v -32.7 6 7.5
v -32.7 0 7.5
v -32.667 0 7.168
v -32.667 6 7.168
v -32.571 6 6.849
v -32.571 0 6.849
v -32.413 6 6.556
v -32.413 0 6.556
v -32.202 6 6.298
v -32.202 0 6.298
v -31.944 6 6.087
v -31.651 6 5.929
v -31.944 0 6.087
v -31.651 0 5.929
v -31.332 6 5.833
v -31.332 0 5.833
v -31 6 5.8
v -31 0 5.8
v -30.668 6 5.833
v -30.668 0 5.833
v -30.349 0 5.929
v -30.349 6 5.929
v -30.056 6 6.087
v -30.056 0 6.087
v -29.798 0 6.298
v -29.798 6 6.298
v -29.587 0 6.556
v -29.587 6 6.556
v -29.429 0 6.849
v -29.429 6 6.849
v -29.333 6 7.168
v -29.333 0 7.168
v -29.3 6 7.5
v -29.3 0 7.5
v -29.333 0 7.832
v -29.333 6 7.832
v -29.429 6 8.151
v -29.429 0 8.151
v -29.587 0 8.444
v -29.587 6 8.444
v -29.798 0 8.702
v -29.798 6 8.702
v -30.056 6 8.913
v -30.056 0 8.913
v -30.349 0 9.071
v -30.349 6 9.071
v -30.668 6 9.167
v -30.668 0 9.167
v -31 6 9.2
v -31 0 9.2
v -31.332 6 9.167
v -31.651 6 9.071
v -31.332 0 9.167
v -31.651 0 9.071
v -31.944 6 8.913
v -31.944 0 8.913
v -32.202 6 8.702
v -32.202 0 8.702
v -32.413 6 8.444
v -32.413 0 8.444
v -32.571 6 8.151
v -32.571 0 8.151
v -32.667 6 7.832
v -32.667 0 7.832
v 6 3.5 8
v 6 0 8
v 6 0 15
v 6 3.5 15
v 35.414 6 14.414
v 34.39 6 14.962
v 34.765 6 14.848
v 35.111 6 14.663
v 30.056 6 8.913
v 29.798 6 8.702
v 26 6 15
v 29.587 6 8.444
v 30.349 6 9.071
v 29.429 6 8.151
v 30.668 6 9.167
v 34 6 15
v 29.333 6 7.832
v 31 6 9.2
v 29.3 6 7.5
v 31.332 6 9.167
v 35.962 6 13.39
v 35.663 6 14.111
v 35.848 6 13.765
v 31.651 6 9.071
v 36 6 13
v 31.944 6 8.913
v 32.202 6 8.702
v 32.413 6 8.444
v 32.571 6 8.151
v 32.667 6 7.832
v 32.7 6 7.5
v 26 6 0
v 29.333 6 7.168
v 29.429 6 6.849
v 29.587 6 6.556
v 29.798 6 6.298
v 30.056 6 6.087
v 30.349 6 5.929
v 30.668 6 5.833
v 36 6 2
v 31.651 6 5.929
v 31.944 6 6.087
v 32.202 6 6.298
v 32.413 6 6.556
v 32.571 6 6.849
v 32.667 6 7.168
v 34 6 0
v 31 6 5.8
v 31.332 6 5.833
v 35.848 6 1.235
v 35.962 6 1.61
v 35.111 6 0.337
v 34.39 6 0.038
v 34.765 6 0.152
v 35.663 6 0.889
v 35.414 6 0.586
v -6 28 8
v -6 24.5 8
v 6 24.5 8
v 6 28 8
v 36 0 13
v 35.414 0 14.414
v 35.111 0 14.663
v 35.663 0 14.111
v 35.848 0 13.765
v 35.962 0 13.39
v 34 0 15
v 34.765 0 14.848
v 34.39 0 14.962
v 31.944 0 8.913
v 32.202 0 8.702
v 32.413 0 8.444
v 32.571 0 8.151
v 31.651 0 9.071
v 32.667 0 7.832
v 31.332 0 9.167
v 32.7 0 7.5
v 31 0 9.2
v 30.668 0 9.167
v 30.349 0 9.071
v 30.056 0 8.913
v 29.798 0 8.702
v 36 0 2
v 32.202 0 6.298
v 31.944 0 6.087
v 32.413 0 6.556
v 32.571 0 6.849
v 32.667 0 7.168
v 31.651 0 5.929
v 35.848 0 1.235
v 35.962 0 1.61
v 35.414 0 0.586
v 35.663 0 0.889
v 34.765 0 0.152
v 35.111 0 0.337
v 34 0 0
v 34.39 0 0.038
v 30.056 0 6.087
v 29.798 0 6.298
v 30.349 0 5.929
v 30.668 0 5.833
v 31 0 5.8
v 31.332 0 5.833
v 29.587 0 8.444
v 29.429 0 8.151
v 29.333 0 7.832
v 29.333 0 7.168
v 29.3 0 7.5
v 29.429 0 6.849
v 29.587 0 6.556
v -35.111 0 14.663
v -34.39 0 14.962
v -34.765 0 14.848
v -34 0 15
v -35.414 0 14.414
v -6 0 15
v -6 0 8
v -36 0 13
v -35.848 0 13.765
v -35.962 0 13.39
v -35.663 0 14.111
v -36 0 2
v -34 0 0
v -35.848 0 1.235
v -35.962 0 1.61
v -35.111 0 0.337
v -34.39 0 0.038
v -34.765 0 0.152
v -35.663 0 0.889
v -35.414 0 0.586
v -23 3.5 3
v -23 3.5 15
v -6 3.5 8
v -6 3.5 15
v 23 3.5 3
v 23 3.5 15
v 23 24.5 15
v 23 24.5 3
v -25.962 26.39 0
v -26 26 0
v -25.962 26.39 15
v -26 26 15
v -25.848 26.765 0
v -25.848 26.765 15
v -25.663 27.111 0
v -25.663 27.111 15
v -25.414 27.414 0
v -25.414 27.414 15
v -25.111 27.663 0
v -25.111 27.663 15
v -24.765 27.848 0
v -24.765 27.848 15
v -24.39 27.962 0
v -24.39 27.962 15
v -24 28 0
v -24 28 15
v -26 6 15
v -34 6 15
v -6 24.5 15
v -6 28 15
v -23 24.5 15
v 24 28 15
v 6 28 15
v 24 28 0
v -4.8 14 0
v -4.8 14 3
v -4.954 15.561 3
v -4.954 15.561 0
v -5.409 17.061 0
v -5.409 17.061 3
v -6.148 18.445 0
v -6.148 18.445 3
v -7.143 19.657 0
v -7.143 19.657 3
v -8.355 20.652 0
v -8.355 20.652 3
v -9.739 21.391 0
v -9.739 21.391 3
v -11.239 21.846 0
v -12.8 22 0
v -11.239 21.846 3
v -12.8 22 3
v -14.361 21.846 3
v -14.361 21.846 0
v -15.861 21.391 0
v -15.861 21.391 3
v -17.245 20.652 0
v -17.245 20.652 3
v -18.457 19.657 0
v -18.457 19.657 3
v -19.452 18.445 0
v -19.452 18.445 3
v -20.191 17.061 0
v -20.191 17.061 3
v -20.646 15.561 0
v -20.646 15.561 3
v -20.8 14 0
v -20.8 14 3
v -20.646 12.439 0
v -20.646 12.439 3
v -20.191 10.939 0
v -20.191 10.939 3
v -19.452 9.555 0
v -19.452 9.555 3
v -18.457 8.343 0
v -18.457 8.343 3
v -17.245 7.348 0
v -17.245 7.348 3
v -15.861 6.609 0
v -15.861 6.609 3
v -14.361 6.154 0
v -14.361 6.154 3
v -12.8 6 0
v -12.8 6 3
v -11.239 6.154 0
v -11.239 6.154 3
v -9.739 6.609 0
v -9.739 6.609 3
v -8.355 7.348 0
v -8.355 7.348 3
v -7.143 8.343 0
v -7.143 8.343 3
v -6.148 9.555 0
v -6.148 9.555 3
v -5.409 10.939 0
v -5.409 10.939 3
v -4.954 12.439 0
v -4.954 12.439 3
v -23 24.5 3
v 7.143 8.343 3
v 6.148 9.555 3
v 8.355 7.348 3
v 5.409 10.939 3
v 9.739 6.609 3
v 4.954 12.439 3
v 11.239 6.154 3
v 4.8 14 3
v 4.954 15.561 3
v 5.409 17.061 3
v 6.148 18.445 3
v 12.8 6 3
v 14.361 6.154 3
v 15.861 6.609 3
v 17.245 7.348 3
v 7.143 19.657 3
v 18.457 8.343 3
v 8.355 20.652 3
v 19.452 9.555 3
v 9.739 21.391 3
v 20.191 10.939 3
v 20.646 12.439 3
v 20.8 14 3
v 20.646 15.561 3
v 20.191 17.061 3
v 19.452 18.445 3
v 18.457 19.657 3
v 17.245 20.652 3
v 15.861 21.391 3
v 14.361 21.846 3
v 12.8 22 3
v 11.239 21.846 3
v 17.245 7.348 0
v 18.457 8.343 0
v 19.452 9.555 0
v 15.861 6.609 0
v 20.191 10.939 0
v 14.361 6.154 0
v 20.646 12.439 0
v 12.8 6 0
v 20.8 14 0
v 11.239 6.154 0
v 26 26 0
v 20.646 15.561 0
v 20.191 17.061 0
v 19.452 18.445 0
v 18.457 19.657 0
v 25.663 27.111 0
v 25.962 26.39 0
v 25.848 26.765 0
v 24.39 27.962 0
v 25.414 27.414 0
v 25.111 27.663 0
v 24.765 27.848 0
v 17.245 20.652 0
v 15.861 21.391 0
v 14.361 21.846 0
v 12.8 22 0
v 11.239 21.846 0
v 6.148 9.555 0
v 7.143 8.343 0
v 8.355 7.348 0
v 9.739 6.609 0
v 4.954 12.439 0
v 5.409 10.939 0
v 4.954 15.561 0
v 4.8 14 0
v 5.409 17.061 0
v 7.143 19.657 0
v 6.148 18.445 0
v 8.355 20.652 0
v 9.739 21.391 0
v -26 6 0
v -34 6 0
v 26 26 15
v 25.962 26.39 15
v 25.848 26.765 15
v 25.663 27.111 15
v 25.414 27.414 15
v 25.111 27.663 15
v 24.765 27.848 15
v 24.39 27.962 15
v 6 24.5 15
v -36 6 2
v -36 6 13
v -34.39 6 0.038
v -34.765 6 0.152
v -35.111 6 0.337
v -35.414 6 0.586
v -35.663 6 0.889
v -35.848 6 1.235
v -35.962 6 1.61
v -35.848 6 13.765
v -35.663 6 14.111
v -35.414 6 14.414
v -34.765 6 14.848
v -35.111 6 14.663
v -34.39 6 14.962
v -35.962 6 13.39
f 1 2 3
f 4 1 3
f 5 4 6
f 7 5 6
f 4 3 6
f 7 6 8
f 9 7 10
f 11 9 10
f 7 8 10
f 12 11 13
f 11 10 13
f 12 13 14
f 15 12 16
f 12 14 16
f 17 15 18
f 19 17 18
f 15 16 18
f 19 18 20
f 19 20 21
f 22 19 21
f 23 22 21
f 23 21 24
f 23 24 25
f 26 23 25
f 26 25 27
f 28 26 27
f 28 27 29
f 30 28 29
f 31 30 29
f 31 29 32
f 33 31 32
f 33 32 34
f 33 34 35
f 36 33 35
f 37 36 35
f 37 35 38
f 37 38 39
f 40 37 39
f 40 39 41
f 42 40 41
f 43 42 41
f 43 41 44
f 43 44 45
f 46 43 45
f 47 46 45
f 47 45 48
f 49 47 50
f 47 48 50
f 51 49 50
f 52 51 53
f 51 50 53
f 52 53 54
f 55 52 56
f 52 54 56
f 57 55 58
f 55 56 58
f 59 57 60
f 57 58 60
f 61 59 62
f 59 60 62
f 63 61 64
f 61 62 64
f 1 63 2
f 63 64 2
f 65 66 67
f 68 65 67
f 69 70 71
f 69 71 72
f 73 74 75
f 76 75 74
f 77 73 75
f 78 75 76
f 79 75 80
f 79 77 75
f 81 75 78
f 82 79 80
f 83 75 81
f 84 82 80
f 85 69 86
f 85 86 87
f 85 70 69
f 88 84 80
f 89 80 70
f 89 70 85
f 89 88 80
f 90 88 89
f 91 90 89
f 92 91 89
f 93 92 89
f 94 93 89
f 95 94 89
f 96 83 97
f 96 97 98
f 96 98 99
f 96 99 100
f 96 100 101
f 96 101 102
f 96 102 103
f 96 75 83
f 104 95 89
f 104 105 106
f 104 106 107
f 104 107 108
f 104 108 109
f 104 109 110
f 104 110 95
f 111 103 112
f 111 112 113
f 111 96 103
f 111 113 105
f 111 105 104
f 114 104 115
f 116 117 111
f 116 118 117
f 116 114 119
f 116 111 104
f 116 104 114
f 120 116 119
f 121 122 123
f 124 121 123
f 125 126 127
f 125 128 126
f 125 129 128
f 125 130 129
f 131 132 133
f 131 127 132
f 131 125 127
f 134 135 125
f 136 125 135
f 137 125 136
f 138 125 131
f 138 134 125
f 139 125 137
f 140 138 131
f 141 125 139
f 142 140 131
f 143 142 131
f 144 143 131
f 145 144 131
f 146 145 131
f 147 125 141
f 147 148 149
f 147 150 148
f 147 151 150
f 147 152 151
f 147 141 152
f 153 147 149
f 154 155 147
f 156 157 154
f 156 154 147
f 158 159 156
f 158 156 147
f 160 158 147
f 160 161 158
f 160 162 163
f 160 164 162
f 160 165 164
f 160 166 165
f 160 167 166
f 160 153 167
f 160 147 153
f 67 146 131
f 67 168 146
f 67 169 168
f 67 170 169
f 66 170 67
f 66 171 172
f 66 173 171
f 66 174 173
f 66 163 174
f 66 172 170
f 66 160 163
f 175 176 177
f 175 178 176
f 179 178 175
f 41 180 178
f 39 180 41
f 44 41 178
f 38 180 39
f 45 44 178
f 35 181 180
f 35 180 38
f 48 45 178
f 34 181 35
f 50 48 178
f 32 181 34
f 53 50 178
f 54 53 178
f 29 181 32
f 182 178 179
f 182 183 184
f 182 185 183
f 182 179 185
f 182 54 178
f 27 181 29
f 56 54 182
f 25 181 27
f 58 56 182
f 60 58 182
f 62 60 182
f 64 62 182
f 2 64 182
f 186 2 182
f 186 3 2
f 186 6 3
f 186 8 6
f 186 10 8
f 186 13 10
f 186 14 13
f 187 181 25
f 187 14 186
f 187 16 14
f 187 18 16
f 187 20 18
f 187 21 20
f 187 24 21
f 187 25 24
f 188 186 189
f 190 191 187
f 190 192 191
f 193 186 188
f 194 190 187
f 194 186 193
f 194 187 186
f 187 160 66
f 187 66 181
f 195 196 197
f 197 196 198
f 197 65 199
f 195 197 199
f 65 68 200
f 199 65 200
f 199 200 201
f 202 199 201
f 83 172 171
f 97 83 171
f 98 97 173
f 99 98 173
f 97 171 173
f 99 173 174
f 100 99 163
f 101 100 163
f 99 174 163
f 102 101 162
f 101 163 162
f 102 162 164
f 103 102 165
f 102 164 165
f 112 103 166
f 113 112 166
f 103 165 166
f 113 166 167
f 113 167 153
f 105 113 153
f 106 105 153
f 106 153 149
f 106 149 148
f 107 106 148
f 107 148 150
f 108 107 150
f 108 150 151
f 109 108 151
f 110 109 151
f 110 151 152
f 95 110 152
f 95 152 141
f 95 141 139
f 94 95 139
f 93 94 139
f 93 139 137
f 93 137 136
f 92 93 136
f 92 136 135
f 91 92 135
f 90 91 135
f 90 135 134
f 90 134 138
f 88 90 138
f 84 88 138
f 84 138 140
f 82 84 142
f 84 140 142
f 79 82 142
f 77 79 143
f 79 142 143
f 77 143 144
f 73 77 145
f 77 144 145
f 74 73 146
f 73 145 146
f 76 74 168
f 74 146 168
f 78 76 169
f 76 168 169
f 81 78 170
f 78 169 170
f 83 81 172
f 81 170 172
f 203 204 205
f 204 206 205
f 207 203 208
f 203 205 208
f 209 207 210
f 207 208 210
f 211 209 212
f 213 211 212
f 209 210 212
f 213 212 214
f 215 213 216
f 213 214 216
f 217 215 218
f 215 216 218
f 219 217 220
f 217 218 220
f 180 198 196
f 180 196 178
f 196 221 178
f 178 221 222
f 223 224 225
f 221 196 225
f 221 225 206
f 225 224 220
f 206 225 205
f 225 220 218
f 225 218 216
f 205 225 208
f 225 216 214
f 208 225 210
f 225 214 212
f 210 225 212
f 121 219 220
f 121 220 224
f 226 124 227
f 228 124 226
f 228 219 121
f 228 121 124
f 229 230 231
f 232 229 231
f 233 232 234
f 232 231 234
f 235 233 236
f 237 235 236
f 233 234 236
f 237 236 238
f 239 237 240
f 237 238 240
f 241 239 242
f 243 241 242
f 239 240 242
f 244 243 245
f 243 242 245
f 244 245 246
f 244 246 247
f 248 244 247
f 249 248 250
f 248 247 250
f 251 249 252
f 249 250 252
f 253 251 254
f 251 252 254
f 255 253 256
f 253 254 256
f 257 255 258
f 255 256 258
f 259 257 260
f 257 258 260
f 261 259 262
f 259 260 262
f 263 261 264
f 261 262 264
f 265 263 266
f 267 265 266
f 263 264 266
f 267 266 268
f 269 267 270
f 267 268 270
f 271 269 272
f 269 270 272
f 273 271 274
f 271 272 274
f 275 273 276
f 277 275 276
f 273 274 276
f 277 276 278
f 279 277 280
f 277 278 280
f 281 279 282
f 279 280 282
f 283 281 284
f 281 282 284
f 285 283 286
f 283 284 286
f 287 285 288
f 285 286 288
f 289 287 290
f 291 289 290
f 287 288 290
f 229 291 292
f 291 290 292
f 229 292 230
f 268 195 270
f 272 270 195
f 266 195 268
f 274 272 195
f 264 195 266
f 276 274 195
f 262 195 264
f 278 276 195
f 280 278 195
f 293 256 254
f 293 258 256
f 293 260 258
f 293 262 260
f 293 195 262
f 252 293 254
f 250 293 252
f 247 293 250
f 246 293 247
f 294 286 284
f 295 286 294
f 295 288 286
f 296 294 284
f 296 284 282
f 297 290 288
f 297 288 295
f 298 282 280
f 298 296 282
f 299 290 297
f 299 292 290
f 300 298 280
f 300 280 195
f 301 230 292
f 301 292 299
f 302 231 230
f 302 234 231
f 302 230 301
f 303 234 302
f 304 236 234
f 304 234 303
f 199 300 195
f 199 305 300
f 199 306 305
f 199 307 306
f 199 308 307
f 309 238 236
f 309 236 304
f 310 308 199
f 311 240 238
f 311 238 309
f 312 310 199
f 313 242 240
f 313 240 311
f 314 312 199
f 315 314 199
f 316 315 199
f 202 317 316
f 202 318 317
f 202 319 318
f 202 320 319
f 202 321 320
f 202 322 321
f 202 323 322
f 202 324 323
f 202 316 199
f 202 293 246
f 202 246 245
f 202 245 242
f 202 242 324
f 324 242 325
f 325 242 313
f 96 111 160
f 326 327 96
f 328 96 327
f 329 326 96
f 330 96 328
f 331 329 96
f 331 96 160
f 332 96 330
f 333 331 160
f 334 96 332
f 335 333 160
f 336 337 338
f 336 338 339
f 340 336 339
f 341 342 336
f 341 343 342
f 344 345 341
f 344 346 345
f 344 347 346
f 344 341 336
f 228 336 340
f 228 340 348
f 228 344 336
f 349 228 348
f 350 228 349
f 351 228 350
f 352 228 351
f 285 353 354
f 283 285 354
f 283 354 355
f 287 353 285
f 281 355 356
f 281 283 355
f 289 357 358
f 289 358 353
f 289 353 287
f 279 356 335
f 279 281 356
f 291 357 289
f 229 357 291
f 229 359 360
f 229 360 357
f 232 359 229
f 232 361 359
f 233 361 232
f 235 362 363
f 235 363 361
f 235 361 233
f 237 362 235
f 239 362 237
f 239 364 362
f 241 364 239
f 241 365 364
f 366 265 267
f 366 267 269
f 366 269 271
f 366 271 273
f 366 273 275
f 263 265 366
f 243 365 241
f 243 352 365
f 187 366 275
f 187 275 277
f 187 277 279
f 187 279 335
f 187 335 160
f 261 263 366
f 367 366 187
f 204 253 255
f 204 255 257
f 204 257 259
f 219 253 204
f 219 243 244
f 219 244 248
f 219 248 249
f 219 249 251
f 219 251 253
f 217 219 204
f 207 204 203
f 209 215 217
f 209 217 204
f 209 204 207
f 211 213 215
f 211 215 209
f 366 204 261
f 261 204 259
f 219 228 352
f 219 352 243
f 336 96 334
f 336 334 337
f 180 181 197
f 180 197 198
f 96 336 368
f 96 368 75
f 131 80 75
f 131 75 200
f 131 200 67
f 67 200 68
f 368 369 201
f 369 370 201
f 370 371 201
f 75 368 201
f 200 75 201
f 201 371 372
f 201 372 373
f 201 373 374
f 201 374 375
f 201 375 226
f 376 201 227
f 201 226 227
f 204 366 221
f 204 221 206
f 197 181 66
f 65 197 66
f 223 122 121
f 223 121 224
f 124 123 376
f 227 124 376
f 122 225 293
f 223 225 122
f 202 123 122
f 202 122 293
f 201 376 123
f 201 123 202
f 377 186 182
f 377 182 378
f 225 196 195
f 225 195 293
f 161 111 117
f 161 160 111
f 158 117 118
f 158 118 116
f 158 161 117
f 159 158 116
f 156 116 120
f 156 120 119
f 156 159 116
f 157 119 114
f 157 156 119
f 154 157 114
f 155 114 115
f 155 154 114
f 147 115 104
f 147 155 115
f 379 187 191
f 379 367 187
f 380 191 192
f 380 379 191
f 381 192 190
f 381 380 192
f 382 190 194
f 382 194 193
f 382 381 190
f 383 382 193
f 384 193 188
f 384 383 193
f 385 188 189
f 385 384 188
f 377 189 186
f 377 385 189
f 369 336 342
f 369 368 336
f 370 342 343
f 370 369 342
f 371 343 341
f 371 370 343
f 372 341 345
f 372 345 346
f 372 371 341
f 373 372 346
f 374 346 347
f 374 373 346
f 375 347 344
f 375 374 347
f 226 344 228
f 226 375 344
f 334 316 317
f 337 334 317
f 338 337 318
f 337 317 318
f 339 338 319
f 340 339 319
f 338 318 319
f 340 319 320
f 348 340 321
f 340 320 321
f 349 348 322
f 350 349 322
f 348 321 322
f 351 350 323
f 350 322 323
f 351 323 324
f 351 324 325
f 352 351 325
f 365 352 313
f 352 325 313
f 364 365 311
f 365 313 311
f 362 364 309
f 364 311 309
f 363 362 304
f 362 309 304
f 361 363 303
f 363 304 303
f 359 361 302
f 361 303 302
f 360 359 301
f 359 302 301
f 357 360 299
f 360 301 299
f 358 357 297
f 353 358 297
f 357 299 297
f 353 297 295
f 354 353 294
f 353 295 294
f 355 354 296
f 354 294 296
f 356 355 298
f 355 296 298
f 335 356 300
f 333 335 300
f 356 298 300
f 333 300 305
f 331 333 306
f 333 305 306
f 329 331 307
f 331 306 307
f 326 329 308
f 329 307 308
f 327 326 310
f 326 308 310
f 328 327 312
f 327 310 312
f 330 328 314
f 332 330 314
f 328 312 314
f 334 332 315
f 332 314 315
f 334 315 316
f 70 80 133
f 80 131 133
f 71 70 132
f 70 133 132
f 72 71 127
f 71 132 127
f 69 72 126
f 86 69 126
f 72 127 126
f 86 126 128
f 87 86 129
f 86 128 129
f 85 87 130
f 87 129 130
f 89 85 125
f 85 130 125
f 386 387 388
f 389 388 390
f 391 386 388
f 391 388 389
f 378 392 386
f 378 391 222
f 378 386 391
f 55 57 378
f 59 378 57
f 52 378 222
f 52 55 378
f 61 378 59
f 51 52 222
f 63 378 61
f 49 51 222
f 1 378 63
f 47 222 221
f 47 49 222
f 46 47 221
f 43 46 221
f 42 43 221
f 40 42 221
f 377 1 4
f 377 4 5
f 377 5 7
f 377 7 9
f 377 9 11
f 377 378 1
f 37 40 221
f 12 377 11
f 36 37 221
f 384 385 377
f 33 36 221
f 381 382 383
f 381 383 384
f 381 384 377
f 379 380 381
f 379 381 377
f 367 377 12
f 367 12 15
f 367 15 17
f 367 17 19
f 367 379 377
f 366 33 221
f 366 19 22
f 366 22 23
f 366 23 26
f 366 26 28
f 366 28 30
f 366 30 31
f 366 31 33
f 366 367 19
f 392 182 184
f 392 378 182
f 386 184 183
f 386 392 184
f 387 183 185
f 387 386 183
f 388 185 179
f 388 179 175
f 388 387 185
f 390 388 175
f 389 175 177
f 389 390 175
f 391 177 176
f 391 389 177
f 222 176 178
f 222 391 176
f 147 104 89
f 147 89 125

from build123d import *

# Parameters (mm, degrees)
BOSS_EXTRU_1_DEPTH      = 15
ESQUISSE2_W             = 46
ESQUISSE2_H             = 21
ENL_V_MAT_EXTRU_1_DEPTH = 12
ESQUISSE4_R             = 8
ENL_V_MAT_EXTRU_2_DEPTH = 3
ENL_V_MAT_EXTRU_3_REACH = 50.01
ESQUISSE5_W             = 12
ESQUISSE5_H             = 7
CONG_1_R                = 2
D_GAGEMENT_M31_D        = 3.4


with BuildPart() as part:
    # Esquisse1 → Boss.-Extru.1 (new body)
    with BuildSketch(Plane.XY):
        Polygon((36, 0), (-36, 0), (-36, 6), (-26, 6), (-26, 28), (26, 28), (26, 6), (36, 6), align=None)
    extrude(amount=BOSS_EXTRU_1_DEPTH)

    # Esquisse2 → Enlèv. mat.-Extru.1 (cut)
    with BuildSketch(Plane.XY.offset(15)):
        with Locations((0, 14)):
            Rectangle(ESQUISSE2_W, ESQUISSE2_H)
    extrude(amount=-ENL_V_MAT_EXTRU_1_DEPTH, mode=Mode.SUBTRACT)

    # Esquisse4 → Enlèv. mat.-Extru.2 (cut)
    with BuildSketch(Plane.XY.offset(3)):
        with Locations((-12.8, 14)):
            Circle(ESQUISSE4_R)
        with Locations((12.8, 14)):
            Circle(ESQUISSE4_R)
    extrude(amount=-ENL_V_MAT_EXTRU_2_DEPTH, mode=Mode.SUBTRACT)

    # Enlèv. mat.-Extru.3: up to this face of the body (flat: up to its plane)
    enl_v_mat_extru_3_end = Plane(part.part.faces().sort_by_distance((0, 28, 7.5))[0])
    # Esquisse5 → Enlèv. mat.-Extru.3 (cut, up to the picked face)
    with BuildSketch(Plane.XZ, mode=Mode.PRIVATE) as enl_v_mat_extru_3_sk1:
        with Locations((0, 11.5)):
            Rectangle(ESQUISSE5_W, ESQUISSE5_H)
    enl_v_mat_extru_3_tool1 = split(extrude(enl_v_mat_extru_3_sk1.sketch, amount=-ENL_V_MAT_EXTRU_3_REACH, mode=Mode.PRIVATE), bisect_by=enl_v_mat_extru_3_end, keep=Keep.BOTH, mode=Mode.PRIVATE)
    add(enl_v_mat_extru_3_tool1.solids().sort_by(Axis((0, 0, 11.5), (0, 1, 0)))[0], mode=Mode.SUBTRACT)

    # Congé1
    cong_1_edges = [part.edges().sort_by_distance(p)[0] for p in [
        (36, 3, 0),
        (-36, 3, 0),
        (36, 3, 15),
        (-26, 28, 7.5),
        (26, 28, 7.5),
        (-36, 3, 15),
    ]]
    fillet(cong_1_edges, radius=CONG_1_R)

    # Dégagement M31 (through all)
    with Locations(Plane(origin=(0, 6, 0), x_dir=(1, 0, 0), z_dir=(0, 1, 0))):
        with Locations((-31, -7.5), (31, -7.5)):
            Hole(D_GAGEMENT_M31_D / 2)


solid = part.part
